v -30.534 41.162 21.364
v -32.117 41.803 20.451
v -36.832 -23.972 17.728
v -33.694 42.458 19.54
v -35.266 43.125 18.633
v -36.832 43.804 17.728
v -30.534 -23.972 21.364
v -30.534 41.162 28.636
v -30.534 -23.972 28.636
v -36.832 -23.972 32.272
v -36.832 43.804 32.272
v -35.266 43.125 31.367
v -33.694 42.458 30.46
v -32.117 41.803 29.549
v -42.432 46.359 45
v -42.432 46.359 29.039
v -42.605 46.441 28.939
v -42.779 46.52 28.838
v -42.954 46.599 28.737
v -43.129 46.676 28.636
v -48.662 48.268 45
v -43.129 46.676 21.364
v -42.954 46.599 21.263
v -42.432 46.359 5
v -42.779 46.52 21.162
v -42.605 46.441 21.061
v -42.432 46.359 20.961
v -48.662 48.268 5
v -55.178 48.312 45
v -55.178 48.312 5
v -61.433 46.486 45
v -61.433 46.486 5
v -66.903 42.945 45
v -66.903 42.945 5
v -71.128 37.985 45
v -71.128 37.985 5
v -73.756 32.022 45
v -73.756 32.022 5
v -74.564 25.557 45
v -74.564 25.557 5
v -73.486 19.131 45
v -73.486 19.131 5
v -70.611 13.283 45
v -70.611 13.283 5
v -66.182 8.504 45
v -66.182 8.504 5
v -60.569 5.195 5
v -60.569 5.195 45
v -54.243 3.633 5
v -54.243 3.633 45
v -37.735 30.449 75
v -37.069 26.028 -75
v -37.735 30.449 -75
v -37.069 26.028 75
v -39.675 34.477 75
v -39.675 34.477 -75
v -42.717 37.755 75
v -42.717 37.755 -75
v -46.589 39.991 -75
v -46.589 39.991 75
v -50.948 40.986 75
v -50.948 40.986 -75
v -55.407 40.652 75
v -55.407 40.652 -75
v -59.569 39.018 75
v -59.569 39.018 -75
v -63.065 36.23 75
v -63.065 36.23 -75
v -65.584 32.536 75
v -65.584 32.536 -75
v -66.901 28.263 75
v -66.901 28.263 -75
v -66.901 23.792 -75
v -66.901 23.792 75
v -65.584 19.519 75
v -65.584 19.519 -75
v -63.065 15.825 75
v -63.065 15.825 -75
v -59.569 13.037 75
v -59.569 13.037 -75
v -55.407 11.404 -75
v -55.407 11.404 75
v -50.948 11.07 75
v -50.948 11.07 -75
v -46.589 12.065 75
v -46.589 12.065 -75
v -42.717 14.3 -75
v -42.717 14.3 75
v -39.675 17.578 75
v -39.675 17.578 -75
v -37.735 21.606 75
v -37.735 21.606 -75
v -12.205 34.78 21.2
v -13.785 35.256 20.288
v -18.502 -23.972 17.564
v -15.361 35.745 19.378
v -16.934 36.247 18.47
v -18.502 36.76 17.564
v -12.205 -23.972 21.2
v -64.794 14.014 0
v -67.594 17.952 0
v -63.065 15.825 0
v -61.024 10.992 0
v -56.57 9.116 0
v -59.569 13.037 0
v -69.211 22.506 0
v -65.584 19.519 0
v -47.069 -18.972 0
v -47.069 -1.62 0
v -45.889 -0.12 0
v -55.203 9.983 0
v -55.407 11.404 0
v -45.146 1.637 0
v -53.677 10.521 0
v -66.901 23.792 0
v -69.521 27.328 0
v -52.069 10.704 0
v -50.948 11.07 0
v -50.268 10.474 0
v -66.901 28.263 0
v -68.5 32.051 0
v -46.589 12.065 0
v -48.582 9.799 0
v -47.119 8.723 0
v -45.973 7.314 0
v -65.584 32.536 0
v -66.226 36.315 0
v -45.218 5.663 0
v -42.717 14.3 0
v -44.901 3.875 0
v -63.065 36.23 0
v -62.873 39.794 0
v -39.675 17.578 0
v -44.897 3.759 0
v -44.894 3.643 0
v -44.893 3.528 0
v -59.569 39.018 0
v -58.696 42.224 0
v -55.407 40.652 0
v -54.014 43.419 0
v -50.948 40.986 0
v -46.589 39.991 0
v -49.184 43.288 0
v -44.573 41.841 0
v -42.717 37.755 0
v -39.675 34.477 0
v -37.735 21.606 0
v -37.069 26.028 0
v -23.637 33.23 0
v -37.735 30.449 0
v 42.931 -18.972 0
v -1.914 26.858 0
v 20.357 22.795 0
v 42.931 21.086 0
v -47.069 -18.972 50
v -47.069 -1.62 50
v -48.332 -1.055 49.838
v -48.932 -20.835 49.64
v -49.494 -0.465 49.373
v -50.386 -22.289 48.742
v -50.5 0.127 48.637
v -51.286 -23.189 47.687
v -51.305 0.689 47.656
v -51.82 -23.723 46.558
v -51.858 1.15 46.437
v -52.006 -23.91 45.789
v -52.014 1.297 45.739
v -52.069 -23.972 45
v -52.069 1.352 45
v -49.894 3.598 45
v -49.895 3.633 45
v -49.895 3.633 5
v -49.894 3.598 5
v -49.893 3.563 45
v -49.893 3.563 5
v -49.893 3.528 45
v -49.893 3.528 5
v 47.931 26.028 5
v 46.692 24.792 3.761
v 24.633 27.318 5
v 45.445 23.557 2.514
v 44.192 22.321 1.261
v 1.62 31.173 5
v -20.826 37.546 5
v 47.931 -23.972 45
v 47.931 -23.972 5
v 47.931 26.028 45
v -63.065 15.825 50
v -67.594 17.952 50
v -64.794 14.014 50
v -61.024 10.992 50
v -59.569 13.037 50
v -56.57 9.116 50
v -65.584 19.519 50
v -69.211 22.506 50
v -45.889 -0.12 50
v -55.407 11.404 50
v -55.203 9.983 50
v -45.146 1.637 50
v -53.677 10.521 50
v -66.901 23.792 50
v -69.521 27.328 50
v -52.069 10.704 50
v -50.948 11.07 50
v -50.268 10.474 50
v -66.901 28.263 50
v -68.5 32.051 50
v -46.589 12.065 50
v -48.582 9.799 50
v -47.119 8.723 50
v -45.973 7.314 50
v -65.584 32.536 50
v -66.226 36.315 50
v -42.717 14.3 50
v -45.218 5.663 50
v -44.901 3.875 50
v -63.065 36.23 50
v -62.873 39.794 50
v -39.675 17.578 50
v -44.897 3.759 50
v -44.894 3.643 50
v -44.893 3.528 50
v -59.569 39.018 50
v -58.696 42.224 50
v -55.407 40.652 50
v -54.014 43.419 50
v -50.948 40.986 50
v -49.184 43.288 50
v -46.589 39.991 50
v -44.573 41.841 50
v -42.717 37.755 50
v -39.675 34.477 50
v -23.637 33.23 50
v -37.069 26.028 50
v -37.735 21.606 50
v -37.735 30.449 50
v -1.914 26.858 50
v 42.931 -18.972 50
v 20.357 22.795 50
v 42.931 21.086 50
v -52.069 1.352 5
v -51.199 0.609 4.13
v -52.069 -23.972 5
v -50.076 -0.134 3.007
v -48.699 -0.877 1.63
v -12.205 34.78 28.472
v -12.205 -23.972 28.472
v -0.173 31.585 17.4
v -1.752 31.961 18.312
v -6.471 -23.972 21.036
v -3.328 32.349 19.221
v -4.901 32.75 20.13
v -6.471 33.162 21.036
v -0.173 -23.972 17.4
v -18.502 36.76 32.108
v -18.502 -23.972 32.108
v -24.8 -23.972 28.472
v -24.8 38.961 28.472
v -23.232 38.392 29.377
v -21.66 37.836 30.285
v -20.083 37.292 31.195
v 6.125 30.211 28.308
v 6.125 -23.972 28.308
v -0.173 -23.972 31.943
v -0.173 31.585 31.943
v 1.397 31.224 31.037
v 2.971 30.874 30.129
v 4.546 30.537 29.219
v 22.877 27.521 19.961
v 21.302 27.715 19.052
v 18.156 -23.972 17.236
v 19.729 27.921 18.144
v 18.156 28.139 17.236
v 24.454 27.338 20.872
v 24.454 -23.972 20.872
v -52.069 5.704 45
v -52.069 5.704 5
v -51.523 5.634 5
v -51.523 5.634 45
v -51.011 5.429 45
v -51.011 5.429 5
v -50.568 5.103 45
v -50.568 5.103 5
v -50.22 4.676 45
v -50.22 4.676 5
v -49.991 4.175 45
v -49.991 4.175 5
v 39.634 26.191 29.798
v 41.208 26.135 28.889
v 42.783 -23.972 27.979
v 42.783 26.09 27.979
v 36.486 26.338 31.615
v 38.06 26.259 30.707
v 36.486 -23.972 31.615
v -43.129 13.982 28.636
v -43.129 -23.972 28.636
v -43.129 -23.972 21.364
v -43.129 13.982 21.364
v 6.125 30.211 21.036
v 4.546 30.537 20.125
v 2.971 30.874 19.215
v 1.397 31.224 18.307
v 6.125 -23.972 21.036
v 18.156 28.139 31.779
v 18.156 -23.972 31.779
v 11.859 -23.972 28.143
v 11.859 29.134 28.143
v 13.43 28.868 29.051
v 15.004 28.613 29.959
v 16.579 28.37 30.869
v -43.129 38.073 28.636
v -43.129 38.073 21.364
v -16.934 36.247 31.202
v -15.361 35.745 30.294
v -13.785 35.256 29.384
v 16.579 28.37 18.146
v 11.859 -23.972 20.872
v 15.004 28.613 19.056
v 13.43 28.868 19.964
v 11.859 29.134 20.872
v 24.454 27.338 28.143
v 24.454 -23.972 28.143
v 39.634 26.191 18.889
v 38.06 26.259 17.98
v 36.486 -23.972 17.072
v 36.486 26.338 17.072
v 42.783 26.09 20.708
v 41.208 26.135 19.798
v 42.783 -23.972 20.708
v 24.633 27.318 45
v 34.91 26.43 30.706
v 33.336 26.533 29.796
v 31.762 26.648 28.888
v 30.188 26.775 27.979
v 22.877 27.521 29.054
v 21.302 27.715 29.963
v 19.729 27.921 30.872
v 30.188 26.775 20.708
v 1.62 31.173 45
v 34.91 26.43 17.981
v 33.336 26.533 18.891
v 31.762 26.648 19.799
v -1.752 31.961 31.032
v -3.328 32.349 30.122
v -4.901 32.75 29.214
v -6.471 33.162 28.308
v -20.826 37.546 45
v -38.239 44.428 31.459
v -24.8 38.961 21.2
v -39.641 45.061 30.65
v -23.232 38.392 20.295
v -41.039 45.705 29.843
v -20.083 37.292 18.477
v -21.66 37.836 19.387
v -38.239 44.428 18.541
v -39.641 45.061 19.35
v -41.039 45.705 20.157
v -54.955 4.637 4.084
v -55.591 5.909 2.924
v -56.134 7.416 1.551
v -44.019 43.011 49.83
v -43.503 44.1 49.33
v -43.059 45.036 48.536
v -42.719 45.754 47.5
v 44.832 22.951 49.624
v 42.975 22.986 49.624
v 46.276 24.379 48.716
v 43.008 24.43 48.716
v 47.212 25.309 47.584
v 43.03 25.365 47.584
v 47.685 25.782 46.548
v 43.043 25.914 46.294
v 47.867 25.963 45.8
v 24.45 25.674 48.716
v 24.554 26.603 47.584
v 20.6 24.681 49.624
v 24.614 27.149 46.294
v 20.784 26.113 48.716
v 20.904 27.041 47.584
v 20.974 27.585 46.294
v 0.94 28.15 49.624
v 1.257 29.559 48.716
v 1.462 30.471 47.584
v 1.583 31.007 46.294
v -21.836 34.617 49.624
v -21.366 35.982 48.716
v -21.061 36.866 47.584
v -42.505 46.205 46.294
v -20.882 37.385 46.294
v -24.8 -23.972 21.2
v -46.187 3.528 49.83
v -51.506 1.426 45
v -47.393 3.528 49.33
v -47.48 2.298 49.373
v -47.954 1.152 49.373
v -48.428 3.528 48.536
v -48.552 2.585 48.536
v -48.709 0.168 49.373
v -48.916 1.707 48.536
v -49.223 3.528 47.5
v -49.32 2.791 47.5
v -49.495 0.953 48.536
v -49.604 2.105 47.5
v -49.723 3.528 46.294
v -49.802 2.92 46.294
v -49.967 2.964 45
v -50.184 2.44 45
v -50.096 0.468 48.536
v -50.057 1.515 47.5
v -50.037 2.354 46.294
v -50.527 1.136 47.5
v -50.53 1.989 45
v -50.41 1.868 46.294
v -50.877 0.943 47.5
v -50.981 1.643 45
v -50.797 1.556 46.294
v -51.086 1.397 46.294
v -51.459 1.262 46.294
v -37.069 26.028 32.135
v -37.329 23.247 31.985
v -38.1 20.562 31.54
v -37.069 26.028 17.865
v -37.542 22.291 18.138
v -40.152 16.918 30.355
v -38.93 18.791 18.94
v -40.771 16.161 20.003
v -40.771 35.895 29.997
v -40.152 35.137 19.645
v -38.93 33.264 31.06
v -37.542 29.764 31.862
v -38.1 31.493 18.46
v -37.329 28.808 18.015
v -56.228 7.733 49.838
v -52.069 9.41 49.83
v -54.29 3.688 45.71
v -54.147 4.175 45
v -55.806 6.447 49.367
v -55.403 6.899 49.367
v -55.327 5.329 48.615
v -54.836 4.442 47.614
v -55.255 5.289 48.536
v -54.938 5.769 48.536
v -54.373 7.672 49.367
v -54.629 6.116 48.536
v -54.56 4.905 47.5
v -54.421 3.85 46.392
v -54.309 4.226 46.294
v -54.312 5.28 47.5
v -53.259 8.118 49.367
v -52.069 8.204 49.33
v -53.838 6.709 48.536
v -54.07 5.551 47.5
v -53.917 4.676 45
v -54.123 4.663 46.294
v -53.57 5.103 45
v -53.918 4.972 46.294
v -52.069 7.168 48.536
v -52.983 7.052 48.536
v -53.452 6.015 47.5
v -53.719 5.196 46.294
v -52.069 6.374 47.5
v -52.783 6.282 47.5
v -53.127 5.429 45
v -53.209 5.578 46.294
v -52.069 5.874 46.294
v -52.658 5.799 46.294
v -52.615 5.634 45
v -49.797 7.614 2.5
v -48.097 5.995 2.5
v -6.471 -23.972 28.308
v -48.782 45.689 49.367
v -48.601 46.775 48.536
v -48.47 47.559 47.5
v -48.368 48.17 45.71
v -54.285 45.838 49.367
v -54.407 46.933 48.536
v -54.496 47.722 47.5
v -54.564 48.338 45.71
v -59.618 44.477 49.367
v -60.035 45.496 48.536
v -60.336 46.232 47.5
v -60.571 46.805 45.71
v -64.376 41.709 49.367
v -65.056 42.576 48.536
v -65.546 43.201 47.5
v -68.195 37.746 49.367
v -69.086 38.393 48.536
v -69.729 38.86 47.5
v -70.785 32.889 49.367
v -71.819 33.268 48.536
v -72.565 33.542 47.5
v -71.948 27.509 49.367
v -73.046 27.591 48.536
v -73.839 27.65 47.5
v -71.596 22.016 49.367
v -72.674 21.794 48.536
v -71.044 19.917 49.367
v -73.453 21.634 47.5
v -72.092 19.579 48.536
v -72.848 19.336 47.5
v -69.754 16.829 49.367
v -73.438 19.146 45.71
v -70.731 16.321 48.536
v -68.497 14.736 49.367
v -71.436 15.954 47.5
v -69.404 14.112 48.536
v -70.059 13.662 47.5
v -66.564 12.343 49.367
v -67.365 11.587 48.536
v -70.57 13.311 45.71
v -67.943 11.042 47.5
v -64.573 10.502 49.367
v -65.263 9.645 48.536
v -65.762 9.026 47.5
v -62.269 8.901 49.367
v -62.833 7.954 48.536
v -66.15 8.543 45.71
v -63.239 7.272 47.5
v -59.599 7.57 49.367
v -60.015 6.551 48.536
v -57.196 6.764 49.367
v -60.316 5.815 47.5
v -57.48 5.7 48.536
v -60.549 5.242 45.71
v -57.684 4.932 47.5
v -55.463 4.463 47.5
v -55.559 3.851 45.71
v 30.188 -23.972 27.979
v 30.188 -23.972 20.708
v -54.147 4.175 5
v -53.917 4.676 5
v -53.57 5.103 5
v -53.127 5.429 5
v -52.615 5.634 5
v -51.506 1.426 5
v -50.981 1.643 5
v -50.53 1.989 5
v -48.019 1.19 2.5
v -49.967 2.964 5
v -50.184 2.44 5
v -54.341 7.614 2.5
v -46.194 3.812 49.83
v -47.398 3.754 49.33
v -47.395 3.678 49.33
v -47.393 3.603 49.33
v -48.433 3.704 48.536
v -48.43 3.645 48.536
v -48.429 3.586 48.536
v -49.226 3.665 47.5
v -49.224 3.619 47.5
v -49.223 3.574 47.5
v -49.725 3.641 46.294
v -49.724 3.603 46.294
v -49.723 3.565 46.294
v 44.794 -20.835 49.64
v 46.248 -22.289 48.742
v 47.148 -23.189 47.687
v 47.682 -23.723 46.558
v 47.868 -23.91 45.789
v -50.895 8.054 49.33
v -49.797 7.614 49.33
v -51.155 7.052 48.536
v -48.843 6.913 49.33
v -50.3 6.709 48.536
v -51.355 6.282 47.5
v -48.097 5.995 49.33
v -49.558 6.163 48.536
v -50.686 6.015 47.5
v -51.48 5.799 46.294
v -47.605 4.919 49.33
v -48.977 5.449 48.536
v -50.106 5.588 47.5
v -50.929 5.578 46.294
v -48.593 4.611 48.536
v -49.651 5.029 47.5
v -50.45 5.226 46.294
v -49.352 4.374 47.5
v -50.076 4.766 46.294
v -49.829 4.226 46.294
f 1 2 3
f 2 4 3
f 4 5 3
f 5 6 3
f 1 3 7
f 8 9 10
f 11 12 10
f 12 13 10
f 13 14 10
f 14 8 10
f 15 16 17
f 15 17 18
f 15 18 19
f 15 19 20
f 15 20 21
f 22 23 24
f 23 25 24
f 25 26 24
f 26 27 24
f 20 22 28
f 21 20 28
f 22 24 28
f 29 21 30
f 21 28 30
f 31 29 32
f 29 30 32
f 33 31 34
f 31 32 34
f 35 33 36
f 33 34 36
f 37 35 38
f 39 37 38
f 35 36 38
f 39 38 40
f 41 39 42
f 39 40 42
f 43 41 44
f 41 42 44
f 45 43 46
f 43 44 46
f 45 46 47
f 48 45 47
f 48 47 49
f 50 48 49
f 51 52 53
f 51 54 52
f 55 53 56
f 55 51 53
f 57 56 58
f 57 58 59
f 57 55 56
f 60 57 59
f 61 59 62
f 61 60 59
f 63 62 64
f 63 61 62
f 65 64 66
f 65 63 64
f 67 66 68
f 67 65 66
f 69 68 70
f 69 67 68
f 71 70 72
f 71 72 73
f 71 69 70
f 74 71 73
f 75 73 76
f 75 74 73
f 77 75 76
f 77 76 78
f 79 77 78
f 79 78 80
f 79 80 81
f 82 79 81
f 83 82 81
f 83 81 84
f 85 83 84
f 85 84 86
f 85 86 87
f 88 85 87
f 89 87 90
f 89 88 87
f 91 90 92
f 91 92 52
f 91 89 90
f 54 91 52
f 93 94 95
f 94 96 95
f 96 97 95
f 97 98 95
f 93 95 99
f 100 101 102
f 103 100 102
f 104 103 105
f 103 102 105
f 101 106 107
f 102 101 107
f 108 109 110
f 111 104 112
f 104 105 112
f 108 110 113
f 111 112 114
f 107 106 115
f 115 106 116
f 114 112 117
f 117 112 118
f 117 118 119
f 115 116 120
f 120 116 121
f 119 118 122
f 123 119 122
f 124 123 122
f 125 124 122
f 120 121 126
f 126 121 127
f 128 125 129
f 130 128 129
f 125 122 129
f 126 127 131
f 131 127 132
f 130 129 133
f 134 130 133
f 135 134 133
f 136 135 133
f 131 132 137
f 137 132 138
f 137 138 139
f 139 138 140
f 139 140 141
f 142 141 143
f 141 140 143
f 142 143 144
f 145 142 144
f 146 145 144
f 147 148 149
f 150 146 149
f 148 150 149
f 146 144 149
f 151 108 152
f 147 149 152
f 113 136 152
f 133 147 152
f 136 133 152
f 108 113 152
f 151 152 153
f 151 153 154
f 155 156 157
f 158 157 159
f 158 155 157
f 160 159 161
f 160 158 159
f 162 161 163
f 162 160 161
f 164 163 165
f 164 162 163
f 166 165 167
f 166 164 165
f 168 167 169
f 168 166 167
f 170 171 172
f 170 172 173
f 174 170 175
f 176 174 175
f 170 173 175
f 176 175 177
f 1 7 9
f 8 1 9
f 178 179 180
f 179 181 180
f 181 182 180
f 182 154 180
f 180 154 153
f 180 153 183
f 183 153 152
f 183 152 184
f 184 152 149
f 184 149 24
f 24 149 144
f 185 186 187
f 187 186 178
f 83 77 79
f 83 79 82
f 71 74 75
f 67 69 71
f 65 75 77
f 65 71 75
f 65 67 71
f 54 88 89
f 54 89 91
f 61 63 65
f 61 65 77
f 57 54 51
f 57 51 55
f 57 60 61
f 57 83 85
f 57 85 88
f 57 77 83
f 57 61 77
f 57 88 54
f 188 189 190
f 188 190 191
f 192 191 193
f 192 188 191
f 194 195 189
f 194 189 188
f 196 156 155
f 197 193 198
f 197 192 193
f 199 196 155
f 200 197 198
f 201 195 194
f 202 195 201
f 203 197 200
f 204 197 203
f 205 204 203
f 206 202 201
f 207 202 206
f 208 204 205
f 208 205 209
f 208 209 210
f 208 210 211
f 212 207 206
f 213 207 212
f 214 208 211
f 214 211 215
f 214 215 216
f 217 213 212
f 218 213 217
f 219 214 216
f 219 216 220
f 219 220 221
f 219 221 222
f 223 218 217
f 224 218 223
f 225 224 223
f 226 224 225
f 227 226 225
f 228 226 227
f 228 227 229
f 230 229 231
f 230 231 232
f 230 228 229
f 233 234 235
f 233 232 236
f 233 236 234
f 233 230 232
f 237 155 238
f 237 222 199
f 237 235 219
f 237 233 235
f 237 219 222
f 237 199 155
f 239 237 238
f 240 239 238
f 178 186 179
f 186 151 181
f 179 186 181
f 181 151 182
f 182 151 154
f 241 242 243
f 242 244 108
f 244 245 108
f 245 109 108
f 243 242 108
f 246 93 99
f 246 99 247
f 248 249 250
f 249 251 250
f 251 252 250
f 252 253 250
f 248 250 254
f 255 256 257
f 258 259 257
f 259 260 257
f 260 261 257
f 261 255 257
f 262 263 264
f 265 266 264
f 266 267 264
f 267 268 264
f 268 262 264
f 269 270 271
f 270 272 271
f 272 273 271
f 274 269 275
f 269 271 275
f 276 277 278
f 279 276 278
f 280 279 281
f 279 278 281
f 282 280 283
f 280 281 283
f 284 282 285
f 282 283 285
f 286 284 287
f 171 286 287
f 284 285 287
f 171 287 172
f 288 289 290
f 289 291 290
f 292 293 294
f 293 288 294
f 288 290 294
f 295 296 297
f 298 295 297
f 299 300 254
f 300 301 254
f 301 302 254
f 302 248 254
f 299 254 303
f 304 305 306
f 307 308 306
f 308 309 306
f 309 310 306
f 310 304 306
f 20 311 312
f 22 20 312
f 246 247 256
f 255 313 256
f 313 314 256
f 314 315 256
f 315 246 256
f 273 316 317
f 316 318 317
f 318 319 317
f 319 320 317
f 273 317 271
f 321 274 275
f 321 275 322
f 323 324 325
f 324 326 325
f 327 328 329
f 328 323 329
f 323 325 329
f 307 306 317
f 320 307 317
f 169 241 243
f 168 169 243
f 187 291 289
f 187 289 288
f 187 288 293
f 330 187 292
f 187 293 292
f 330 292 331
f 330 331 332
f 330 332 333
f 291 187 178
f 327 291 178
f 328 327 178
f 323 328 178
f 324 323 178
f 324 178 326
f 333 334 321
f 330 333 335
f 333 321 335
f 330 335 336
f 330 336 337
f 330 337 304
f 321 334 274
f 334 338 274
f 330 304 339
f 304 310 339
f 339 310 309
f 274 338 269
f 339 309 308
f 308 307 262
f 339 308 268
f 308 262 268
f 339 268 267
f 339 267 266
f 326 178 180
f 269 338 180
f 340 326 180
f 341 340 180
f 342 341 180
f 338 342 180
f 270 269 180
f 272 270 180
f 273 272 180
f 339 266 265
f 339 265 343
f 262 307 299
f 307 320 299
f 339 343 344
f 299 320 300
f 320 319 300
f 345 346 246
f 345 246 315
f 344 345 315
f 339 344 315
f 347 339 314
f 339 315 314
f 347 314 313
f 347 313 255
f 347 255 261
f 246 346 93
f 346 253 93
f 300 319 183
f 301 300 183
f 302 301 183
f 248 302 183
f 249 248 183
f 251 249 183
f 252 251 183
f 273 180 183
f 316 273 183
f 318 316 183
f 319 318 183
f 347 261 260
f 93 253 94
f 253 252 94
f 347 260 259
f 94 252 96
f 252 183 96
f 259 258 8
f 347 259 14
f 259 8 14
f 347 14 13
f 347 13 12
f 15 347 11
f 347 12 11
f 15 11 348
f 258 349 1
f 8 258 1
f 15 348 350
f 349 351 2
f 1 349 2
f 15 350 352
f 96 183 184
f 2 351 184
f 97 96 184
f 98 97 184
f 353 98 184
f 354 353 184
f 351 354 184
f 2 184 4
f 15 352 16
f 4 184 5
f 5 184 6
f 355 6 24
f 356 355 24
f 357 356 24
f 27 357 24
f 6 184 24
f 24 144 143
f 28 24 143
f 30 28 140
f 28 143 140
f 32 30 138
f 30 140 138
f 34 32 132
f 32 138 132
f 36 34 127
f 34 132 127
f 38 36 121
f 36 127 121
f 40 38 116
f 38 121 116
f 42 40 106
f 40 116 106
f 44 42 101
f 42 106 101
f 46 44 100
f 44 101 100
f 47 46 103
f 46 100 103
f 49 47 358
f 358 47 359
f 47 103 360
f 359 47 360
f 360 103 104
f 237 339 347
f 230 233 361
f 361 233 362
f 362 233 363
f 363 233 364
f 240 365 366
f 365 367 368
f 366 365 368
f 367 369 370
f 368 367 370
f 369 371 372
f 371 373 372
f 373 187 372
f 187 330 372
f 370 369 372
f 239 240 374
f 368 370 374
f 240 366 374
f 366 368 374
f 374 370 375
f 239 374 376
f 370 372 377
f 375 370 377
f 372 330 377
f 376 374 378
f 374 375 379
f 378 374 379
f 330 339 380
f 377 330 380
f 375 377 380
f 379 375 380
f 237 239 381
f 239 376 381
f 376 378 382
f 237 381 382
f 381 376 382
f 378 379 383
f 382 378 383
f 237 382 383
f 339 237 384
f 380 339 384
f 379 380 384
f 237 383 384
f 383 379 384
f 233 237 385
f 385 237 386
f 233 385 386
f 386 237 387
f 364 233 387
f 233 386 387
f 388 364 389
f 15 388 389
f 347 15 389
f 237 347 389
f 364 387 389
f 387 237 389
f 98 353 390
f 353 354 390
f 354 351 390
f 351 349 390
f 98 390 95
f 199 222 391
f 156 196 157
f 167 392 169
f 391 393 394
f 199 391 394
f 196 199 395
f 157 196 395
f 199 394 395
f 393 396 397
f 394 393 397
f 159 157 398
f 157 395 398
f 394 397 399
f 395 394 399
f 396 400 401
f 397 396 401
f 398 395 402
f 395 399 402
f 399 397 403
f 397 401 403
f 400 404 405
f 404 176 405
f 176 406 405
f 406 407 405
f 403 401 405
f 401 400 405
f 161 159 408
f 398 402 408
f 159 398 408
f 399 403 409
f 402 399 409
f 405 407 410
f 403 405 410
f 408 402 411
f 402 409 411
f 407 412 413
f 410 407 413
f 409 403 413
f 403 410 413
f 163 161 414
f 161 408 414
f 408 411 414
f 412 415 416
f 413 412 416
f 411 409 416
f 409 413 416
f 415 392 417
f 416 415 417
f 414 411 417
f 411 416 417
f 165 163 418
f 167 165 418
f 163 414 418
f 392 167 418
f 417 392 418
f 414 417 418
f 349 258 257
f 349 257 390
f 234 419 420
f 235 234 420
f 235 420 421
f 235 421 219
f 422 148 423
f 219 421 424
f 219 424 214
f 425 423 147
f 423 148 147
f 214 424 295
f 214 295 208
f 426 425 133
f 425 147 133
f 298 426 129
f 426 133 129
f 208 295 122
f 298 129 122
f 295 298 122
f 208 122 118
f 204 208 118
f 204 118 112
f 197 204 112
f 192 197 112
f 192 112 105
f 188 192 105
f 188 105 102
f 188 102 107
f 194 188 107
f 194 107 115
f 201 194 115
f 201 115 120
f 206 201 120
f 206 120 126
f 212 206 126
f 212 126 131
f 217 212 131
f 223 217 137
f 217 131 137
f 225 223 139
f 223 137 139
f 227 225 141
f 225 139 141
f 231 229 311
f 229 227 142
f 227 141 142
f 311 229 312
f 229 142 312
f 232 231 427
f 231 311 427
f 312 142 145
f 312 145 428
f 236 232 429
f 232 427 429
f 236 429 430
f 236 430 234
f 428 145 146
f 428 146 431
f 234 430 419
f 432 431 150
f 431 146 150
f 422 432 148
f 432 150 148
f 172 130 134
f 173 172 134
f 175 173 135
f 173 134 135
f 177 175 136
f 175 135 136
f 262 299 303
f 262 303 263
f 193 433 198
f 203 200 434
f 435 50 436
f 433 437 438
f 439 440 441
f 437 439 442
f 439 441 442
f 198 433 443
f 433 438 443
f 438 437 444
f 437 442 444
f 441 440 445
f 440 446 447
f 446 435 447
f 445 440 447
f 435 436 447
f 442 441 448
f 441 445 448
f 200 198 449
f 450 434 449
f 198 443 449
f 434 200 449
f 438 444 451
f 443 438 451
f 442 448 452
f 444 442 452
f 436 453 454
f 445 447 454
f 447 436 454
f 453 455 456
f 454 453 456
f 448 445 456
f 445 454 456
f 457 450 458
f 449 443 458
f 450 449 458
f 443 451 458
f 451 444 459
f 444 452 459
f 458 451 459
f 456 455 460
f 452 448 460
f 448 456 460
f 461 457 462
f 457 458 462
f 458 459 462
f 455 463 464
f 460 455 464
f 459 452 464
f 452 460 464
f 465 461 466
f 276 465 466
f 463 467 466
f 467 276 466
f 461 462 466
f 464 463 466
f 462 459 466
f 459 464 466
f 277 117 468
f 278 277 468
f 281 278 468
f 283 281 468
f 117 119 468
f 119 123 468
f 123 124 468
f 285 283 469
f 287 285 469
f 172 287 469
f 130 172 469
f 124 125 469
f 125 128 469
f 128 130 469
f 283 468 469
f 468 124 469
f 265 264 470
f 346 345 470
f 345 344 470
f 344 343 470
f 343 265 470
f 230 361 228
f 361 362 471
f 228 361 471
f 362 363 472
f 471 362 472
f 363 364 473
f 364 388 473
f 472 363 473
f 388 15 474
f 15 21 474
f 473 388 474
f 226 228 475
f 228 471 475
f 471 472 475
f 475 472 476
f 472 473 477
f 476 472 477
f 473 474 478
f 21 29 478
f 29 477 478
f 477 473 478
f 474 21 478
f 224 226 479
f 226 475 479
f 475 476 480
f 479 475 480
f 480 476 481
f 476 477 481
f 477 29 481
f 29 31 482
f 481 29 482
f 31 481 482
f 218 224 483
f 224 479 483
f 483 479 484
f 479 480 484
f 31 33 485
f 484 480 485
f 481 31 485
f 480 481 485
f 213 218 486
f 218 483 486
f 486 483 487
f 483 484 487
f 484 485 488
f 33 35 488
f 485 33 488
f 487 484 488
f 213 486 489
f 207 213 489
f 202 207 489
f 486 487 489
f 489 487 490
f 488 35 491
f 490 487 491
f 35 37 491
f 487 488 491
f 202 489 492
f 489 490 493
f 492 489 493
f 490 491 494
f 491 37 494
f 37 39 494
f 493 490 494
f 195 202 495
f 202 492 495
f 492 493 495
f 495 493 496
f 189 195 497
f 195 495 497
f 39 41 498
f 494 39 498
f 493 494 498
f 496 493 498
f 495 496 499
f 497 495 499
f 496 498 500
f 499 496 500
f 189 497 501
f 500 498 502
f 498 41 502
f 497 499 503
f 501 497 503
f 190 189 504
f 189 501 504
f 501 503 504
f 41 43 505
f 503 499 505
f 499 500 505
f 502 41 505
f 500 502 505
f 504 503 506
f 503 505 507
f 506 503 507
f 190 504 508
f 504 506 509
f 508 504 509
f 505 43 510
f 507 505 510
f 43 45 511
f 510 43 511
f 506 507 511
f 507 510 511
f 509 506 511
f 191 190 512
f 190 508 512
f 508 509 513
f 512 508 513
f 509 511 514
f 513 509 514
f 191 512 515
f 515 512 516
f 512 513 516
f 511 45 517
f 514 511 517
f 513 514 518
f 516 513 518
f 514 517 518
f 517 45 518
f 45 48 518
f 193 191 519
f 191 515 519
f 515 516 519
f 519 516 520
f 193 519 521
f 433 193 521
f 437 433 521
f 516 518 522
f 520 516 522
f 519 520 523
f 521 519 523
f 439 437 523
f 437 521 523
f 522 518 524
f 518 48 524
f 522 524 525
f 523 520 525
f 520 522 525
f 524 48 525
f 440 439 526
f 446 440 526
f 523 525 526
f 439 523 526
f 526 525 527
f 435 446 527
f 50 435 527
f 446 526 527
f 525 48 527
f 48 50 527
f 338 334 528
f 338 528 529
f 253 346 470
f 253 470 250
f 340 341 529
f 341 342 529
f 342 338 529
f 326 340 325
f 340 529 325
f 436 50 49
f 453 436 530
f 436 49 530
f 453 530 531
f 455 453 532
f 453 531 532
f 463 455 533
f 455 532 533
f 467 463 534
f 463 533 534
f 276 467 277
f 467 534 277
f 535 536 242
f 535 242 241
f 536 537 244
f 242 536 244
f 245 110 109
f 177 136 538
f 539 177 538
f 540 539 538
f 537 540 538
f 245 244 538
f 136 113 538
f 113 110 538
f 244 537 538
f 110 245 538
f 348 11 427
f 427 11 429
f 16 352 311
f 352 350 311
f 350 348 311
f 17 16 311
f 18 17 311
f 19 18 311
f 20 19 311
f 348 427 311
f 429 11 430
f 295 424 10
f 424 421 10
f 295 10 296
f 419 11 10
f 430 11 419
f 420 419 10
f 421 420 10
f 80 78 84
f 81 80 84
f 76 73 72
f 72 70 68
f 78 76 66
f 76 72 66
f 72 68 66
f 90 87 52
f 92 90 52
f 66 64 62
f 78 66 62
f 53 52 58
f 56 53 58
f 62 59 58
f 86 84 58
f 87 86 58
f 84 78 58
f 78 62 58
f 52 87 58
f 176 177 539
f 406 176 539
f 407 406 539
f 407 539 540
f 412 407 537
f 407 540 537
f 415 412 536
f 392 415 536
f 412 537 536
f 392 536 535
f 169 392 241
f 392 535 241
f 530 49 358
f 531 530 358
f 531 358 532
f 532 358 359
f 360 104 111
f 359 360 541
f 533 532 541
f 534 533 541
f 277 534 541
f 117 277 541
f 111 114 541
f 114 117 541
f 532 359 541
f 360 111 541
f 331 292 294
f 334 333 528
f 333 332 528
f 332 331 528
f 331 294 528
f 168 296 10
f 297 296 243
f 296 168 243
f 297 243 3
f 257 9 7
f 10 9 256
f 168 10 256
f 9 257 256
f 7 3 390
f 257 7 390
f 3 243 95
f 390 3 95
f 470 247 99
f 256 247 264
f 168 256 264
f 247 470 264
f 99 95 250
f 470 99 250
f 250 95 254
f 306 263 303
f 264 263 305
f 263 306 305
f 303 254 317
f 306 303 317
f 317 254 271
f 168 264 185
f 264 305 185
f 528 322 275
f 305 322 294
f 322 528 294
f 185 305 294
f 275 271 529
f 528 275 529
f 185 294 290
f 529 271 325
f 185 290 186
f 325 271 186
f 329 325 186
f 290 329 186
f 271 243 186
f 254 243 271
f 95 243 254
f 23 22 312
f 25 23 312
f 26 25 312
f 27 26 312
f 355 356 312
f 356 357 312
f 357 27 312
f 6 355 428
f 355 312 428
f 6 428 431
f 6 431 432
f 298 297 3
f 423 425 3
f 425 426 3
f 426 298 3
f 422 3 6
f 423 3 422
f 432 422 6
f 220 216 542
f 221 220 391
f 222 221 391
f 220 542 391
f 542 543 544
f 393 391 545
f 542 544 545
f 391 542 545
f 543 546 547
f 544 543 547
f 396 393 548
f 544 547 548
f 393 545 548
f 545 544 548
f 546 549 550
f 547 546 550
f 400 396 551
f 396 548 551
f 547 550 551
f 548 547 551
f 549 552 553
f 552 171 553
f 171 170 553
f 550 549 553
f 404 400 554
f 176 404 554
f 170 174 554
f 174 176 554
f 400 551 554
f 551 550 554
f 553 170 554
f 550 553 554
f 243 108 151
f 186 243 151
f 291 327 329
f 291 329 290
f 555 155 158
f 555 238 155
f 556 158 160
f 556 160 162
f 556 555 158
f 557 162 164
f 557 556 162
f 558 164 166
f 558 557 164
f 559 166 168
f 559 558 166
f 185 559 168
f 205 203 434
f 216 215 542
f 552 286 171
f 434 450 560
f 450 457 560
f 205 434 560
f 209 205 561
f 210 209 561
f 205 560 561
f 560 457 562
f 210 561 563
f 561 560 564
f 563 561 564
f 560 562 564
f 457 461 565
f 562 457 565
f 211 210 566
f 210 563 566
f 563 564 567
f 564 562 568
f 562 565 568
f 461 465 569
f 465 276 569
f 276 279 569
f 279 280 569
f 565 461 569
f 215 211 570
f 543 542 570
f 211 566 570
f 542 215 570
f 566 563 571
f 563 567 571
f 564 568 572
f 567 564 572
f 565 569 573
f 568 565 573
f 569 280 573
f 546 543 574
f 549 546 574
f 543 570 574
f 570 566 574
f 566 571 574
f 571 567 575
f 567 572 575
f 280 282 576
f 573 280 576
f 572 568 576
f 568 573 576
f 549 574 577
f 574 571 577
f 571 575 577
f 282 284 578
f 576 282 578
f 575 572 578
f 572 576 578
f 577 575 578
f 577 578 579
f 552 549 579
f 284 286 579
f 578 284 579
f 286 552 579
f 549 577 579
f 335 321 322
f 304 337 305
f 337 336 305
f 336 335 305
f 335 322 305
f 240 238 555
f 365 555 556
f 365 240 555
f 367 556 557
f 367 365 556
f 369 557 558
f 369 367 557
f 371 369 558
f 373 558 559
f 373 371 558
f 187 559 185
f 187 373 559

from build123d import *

# Parameters (mm, degrees)
F1_DEPTH = 50
F2_DEPTH = 75
F4_DEPTH = 72.501
F5_R     = 5
F6_SIZE  = 5


with BuildPart() as f1:
    # F0 (on Top) → F1 (new body)
    with BuildSketch(Plane.XY):
        with BuildLine():
            ThreePointArc((-52.0689964294, 11.0276228632), (-62.6755981472, 36.634224581), (-37.0689964294, 26.0276228632))
            Line((-37.0689964294, 26.0276228632), (-29.5689964294, 26.0276228632))
            ThreePointArc((-29.5689964294, 26.0276228632), (-33.0547226183, 38.0570613968), (-42.431875668, 46.3592706919))
            ThreePointArc((-42.431875668, 46.3592706919), (-73.7556932891, 32.0223855205), (-54.2425595338, 3.6328550942))
            ThreePointArc((-54.2425595338, 3.6328550942), (-53.5700716418, 5.103130273), (-52.0689964294, 5.7037318658))
            Line((-52.0689964294, 5.7037318658), (-52.0689964294, 11.0276228632))
        make_face()
        with BuildLine():
            Line((-29.5689964294, 26.0276228632), (-37.0689964294, 26.0276228632))
            ThreePointArc((-37.0689964294, 26.0276228632), (-41.4623947116, 15.4210211454), (-52.0689964294, 11.0276228632))
            Line((-52.0689964294, 11.0276228632), (-52.0689964294, 5.7037318658))
            ThreePointArc((-52.0689964294, 5.7037318658), (-50.5679212171, 5.103130273), (-49.8954333251, 3.6328550942))
            ThreePointArc((-49.8954333251, 3.6328550942), (-35.4083366309, 10.905704497), (-29.5689964294, 26.0276228632))
        make_face()
        with BuildLine():
            ThreePointArc((-42.431875668, 46.3592706919), (-33.0547226183, 38.0570613968), (-29.5689964294, 26.0276228632))
            Line((-29.5689964294, 26.0276228632), (47.9310035706, 26.0276228632))
            ThreePointArc((47.9310035706, 26.0276228632), (1.6200279608, 31.1732868199), (-42.431875668, 46.3592706919))
        make_face()
        with BuildLine():
            Line((47.9310035706, 26.0276228632), (-29.5689964294, 26.0276228632))
            ThreePointArc((-29.5689964294, 26.0276228632), (-35.4083366309, 10.905704497), (-49.8954333251, 3.6328550942))
            ThreePointArc((-49.8954333251, 3.6328550942), (-49.8935239945, 3.5802543748), (-49.8928874269, 3.5276228632))
            ThreePointArc((-49.8928874269, 3.5276228632), (-50.5302549971, 1.9888814309), (-52.0689964294, 1.3515138607))
            Line((-52.0689964294, 1.3515138607), (-52.0689964294, -23.9723771368))
            Line((-52.0689964294, -23.9723771368), (47.9310035706, -23.9723771368))
            Line((47.9310035706, -23.9723771368), (47.9310035706, 26.0276228632))
        make_face()
    extrude(amount=F1_DEPTH)

    # F3 (on face) → F4 (cut, through all)
    with BuildSketch(Plane.XZ.offset(23.9723771368)):
        Polygon((-30.5344704539, 21.364131914), (-30.5344704539, 28.635868086), (-36.8319787085, 32.2717361721), (-43.1294869632, 28.635868086), (-43.1294869632, 21.364131914), (-36.8319787085, 17.7282638279), align=None)
        Polygon((-18.5024917454, 32.1076042581), (-24.8, 28.4717361721), (-24.8, 21.2), (-18.5024917454, 17.564131914), (-12.2049834907, 21.2), (-12.2049834907, 28.4717361721), align=None)
        Polygon((-0.1730047822, 31.9434723442), (-6.4705130368, 28.3076042581), (-6.4705130368, 21.035868086), (-0.1730047822, 17.4), (6.1245034724, 21.035868086), (6.1245034724, 28.3076042581), align=None)
        Polygon((18.156482181, 31.7793404302), (11.8589739263, 28.1434723442), (11.8589739263, 20.8717361721), (18.156482181, 17.235868086), (24.4539904356, 20.8717361721), (24.4539904356, 28.1434723442), align=None)
        Polygon((36.4859691441, 31.6152085163), (30.1884608895, 27.9793404302), (30.1884608895, 20.7076042581), (36.4859691441, 17.0717361721), (42.7834773988, 20.7076042581), (42.7834773988, 27.9793404302), align=None)
    extrude(amount=-F4_DEPTH, mode=Mode.SUBTRACT)

    # F5
    f5_edges = [f1.edges().sort_by_distance(p)[0] for p in [
        (-2.068996, -23.972377, 50),
        (47.931004, 1.027623, 50),
        (1.620028, 31.173287, 50),
        (-73.755693, 32.022386, 50),
        (-52.068996, -11.310432, 50),
        (-50.493489, 5.028698, 50),
    ]]
    fillet(f5_edges, radius=F5_R)

    # F6
    f6_edges = [f1.edges().sort_by_distance(p)[0] for p in [
        (-2.068996, -23.972377, 0),
        (47.931004, 1.027623, 0),
        (1.620028, 31.173287, 0),
        (-73.755693, 32.022386, 0),
        (-50.493489, 5.028698, 0),
        (-52.068996, -11.310432, 0),
    ]]
    chamfer(f6_edges, length=F6_SIZE)


with BuildPart() as f2:
    # F0 (on Top) → F2 (new body, symmetric)
    with BuildSketch(Plane.XY):
        with BuildLine():
            Line((-37.0689964294, 26.0276228632), (-52.0689964294, 26.0276228632))
            Line((-52.0689964294, 26.0276228632), (-52.0689964294, 11.0276228632))
            ThreePointArc((-52.0689964294, 11.0276228632), (-41.4623947116, 15.4210211454), (-37.0689964294, 26.0276228632))
        make_face()
        with BuildLine():
            Line((-52.0689964294, 11.0276228632), (-52.0689964294, 26.0276228632))
            Line((-52.0689964294, 26.0276228632), (-37.0689964294, 26.0276228632))
            ThreePointArc((-37.0689964294, 26.0276228632), (-62.6755981472, 36.634224581), (-52.0689964294, 11.0276228632))
        make_face()
    extrude(amount=F2_DEPTH, both=True)


solid = Compound([f1.part, f2.part])
